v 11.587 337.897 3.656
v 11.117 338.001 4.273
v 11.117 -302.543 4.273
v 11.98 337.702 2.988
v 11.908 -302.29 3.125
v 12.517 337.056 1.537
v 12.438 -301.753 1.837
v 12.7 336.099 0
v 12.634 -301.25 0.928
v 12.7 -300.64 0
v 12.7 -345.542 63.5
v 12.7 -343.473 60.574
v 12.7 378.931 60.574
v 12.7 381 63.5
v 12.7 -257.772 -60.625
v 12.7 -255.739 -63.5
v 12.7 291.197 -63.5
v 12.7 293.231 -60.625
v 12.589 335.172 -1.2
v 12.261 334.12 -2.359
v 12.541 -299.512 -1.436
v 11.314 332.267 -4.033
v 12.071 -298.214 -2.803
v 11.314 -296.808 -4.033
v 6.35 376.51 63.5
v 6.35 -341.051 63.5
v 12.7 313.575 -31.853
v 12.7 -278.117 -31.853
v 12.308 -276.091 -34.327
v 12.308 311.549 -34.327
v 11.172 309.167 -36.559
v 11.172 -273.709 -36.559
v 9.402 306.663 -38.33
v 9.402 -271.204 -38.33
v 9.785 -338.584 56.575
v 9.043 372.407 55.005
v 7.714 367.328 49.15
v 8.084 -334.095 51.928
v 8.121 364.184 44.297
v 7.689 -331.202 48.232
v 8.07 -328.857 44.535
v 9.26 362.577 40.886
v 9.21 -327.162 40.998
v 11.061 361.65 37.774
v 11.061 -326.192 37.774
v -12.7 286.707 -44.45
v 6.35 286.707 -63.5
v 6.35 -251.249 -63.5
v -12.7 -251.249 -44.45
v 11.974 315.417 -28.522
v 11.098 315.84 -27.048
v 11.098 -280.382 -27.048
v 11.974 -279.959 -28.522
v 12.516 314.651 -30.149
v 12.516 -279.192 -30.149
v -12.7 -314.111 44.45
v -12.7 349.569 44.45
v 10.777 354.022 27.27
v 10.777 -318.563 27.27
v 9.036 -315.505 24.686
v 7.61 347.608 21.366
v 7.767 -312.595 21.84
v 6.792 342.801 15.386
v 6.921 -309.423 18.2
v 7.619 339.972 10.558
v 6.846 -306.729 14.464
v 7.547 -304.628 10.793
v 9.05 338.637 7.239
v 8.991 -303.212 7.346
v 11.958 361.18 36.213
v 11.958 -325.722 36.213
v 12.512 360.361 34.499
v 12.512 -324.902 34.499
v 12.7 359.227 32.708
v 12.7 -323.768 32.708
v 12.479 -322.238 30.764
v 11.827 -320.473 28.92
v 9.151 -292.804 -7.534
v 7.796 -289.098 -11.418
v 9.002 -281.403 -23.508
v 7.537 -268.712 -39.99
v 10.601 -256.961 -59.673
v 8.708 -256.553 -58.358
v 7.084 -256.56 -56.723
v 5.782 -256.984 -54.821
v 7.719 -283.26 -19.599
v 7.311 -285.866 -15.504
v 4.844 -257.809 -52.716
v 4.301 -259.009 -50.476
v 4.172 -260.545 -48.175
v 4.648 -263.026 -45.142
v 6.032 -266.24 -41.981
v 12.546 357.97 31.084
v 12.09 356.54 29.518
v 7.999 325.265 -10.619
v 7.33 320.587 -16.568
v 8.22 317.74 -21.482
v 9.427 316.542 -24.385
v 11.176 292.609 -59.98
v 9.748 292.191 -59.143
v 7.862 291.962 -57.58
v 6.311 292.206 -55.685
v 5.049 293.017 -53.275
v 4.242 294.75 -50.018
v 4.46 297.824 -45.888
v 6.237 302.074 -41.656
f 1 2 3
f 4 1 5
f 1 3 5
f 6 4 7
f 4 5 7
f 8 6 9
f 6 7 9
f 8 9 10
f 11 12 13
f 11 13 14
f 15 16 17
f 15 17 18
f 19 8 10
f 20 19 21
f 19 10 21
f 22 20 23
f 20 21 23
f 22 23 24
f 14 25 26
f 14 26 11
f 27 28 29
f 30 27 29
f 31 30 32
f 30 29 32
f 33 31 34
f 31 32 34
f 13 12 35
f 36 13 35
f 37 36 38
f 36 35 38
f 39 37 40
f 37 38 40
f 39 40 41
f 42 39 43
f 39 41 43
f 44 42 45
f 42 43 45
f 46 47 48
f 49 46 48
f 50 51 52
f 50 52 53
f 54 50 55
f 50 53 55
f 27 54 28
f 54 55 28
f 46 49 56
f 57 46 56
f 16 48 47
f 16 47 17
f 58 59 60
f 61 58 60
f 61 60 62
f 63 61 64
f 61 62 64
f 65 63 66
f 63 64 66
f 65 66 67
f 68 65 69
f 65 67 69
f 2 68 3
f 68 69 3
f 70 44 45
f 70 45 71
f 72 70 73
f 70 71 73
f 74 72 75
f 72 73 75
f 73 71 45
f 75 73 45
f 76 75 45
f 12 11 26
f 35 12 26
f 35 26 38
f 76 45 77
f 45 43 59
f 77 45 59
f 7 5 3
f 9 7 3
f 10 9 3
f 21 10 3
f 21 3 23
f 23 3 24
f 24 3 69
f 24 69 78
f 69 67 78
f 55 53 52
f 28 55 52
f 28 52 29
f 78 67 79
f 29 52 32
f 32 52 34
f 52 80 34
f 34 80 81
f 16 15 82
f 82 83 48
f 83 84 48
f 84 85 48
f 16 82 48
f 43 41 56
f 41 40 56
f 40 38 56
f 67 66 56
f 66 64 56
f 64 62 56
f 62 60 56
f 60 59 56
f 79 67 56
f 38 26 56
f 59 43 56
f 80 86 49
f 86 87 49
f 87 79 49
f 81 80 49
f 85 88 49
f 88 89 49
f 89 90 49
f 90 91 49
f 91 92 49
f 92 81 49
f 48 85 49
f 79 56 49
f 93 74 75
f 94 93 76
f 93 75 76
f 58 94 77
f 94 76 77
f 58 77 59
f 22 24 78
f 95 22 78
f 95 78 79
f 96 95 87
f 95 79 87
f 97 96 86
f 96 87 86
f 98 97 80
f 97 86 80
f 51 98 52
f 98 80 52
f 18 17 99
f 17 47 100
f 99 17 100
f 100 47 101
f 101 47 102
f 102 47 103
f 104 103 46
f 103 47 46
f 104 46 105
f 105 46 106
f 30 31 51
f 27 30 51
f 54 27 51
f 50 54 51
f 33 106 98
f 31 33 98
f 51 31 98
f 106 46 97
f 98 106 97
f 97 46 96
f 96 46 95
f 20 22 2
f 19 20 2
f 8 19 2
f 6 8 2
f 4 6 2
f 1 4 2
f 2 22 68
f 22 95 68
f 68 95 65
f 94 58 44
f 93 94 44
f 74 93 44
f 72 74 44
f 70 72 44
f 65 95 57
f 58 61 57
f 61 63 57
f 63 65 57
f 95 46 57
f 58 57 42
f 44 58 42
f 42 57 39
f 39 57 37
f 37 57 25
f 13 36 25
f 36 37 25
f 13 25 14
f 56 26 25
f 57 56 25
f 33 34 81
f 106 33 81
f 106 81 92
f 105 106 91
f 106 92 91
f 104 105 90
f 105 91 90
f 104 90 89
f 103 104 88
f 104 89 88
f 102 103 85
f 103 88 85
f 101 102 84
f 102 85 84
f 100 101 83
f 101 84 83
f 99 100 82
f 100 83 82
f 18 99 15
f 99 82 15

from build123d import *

# Parameters (mm, degrees)
F0_W     = 25.4
F0_H     = 127
F1_DEPTH = 381
F2_SIZE  = 19.05
F4_DEPTH = 762.001
F6_DEPTH = 94.2936892712


with BuildPart() as f1:
    # F0 (on Front) → F1 (new body, symmetric)
    with BuildSketch(Plane.XZ):
        Rectangle(F0_W, F0_H)
    extrude(amount=F1_DEPTH, both=True)

    # F2
    f2_edges = [f1.edges().sort_by_distance(p)[0] for p in [
        (-12.7, 0, 63.5),
        (-12.7, 0, -63.5),
    ]]
    chamfer(f2_edges, length=F2_SIZE)

    # F3 (on face) → F4 (cut, through all)
    with BuildSketch(Plane.XZ.offset(381)):
        with BuildLine():
            ThreePointArc((11.0607444282, 37.7743444236), (12.2799882072, 35.3703719511), (12.7, 32.7078113162))
            Line((12.7, 32.7078113162), (12.7, 60.5742454254))
            ThreePointArc((12.7, 60.5742454254), (7.734521827, 49.4723711463), (11.0607444282, 37.7743444236))
        make_face()
        with BuildLine():
            ThreePointArc((12.7, 32.7078113162), (12.2050831664, 29.8239852054), (10.7769712009, 27.270185698))
            ThreePointArc((10.7769712009, 27.270185698), (6.7846666798, 15.7099875002), (11.1173224388, 4.2729961198))
            ThreePointArc((11.1173224388, 4.2729961198), (12.2916182124, 2.2783417271), (12.7, 0))
            Line((12.7, 0), (12.7, 32.7078113162))
        make_face()
        with BuildLine():
            Line((12.7, -31.8533331156), (12.7, 0))
            ThreePointArc((12.7, 0), (12.3437587955, -2.132292065), (11.3137291276, -4.0329803954))
            ThreePointArc((11.3137291276, -4.0329803954), (7.3105875393, -15.5042613468), (11.0984736295, -27.0484091373))
            ThreePointArc((11.0984736295, -27.0484091373), (12.2890761787, -29.3209339985), (12.7, -31.8533331156))
        make_face()
        with BuildLine():
            Line((12.7, -60.6248162719), (12.7, -31.8533331156))
            ThreePointArc((12.7, -31.8533331156), (11.8279315788, -35.4875740202), (9.4016464054, -38.3303456503))
            ThreePointArc((9.4016464054, -38.3303456503), (4.3012002964, -50.4761533584), (12.7, -60.6248162719))
        make_face()
    extrude(amount=-F4_DEPTH, mode=Mode.SUBTRACT)

    # F5 (on face) → F6 (cut, through all)
    with BuildSketch(Plane(origin=(-28.575, 0, 28.575), x_dir=(0, -1, 0), z_dir=(-0.7071067812, 0, 0.7071067812))):
        Polygon((381, 22.4506403027), (314.1107035763, 22.4506403027), (238.774623845, -52.8854394286), (381, -52.8854394286), align=None)
        Polygon((381, 49.3914086659), (341.0514719395, 49.3914086659), (314.1107035763, 22.4506403027), (381, 22.4506403027), align=None)
        Polygon((381, 53.8815367264), (345.5416, 53.8815367264), (341.0514719395, 49.3914086659), (381, 49.3914086659), align=None)
        Polygon((-349.5691035763, 22.4506403027), (-381, 22.4506403027), (-381, -78.4676751543), (-248.6507881192, -78.4676751543), align=None)
        Polygon((-376.5098719395, 49.3914086659), (-381, 49.3914086659), (-381, 22.4506403027), (-349.5691035763, 22.4506403027), align=None)
        Polygon((-376.5098719395, 49.3914086659), (-381, 53.8815367264), (-381, 49.3914086659), align=None)
    extrude(amount=-F6_DEPTH, mode=Mode.SUBTRACT)


solid = f1.part
